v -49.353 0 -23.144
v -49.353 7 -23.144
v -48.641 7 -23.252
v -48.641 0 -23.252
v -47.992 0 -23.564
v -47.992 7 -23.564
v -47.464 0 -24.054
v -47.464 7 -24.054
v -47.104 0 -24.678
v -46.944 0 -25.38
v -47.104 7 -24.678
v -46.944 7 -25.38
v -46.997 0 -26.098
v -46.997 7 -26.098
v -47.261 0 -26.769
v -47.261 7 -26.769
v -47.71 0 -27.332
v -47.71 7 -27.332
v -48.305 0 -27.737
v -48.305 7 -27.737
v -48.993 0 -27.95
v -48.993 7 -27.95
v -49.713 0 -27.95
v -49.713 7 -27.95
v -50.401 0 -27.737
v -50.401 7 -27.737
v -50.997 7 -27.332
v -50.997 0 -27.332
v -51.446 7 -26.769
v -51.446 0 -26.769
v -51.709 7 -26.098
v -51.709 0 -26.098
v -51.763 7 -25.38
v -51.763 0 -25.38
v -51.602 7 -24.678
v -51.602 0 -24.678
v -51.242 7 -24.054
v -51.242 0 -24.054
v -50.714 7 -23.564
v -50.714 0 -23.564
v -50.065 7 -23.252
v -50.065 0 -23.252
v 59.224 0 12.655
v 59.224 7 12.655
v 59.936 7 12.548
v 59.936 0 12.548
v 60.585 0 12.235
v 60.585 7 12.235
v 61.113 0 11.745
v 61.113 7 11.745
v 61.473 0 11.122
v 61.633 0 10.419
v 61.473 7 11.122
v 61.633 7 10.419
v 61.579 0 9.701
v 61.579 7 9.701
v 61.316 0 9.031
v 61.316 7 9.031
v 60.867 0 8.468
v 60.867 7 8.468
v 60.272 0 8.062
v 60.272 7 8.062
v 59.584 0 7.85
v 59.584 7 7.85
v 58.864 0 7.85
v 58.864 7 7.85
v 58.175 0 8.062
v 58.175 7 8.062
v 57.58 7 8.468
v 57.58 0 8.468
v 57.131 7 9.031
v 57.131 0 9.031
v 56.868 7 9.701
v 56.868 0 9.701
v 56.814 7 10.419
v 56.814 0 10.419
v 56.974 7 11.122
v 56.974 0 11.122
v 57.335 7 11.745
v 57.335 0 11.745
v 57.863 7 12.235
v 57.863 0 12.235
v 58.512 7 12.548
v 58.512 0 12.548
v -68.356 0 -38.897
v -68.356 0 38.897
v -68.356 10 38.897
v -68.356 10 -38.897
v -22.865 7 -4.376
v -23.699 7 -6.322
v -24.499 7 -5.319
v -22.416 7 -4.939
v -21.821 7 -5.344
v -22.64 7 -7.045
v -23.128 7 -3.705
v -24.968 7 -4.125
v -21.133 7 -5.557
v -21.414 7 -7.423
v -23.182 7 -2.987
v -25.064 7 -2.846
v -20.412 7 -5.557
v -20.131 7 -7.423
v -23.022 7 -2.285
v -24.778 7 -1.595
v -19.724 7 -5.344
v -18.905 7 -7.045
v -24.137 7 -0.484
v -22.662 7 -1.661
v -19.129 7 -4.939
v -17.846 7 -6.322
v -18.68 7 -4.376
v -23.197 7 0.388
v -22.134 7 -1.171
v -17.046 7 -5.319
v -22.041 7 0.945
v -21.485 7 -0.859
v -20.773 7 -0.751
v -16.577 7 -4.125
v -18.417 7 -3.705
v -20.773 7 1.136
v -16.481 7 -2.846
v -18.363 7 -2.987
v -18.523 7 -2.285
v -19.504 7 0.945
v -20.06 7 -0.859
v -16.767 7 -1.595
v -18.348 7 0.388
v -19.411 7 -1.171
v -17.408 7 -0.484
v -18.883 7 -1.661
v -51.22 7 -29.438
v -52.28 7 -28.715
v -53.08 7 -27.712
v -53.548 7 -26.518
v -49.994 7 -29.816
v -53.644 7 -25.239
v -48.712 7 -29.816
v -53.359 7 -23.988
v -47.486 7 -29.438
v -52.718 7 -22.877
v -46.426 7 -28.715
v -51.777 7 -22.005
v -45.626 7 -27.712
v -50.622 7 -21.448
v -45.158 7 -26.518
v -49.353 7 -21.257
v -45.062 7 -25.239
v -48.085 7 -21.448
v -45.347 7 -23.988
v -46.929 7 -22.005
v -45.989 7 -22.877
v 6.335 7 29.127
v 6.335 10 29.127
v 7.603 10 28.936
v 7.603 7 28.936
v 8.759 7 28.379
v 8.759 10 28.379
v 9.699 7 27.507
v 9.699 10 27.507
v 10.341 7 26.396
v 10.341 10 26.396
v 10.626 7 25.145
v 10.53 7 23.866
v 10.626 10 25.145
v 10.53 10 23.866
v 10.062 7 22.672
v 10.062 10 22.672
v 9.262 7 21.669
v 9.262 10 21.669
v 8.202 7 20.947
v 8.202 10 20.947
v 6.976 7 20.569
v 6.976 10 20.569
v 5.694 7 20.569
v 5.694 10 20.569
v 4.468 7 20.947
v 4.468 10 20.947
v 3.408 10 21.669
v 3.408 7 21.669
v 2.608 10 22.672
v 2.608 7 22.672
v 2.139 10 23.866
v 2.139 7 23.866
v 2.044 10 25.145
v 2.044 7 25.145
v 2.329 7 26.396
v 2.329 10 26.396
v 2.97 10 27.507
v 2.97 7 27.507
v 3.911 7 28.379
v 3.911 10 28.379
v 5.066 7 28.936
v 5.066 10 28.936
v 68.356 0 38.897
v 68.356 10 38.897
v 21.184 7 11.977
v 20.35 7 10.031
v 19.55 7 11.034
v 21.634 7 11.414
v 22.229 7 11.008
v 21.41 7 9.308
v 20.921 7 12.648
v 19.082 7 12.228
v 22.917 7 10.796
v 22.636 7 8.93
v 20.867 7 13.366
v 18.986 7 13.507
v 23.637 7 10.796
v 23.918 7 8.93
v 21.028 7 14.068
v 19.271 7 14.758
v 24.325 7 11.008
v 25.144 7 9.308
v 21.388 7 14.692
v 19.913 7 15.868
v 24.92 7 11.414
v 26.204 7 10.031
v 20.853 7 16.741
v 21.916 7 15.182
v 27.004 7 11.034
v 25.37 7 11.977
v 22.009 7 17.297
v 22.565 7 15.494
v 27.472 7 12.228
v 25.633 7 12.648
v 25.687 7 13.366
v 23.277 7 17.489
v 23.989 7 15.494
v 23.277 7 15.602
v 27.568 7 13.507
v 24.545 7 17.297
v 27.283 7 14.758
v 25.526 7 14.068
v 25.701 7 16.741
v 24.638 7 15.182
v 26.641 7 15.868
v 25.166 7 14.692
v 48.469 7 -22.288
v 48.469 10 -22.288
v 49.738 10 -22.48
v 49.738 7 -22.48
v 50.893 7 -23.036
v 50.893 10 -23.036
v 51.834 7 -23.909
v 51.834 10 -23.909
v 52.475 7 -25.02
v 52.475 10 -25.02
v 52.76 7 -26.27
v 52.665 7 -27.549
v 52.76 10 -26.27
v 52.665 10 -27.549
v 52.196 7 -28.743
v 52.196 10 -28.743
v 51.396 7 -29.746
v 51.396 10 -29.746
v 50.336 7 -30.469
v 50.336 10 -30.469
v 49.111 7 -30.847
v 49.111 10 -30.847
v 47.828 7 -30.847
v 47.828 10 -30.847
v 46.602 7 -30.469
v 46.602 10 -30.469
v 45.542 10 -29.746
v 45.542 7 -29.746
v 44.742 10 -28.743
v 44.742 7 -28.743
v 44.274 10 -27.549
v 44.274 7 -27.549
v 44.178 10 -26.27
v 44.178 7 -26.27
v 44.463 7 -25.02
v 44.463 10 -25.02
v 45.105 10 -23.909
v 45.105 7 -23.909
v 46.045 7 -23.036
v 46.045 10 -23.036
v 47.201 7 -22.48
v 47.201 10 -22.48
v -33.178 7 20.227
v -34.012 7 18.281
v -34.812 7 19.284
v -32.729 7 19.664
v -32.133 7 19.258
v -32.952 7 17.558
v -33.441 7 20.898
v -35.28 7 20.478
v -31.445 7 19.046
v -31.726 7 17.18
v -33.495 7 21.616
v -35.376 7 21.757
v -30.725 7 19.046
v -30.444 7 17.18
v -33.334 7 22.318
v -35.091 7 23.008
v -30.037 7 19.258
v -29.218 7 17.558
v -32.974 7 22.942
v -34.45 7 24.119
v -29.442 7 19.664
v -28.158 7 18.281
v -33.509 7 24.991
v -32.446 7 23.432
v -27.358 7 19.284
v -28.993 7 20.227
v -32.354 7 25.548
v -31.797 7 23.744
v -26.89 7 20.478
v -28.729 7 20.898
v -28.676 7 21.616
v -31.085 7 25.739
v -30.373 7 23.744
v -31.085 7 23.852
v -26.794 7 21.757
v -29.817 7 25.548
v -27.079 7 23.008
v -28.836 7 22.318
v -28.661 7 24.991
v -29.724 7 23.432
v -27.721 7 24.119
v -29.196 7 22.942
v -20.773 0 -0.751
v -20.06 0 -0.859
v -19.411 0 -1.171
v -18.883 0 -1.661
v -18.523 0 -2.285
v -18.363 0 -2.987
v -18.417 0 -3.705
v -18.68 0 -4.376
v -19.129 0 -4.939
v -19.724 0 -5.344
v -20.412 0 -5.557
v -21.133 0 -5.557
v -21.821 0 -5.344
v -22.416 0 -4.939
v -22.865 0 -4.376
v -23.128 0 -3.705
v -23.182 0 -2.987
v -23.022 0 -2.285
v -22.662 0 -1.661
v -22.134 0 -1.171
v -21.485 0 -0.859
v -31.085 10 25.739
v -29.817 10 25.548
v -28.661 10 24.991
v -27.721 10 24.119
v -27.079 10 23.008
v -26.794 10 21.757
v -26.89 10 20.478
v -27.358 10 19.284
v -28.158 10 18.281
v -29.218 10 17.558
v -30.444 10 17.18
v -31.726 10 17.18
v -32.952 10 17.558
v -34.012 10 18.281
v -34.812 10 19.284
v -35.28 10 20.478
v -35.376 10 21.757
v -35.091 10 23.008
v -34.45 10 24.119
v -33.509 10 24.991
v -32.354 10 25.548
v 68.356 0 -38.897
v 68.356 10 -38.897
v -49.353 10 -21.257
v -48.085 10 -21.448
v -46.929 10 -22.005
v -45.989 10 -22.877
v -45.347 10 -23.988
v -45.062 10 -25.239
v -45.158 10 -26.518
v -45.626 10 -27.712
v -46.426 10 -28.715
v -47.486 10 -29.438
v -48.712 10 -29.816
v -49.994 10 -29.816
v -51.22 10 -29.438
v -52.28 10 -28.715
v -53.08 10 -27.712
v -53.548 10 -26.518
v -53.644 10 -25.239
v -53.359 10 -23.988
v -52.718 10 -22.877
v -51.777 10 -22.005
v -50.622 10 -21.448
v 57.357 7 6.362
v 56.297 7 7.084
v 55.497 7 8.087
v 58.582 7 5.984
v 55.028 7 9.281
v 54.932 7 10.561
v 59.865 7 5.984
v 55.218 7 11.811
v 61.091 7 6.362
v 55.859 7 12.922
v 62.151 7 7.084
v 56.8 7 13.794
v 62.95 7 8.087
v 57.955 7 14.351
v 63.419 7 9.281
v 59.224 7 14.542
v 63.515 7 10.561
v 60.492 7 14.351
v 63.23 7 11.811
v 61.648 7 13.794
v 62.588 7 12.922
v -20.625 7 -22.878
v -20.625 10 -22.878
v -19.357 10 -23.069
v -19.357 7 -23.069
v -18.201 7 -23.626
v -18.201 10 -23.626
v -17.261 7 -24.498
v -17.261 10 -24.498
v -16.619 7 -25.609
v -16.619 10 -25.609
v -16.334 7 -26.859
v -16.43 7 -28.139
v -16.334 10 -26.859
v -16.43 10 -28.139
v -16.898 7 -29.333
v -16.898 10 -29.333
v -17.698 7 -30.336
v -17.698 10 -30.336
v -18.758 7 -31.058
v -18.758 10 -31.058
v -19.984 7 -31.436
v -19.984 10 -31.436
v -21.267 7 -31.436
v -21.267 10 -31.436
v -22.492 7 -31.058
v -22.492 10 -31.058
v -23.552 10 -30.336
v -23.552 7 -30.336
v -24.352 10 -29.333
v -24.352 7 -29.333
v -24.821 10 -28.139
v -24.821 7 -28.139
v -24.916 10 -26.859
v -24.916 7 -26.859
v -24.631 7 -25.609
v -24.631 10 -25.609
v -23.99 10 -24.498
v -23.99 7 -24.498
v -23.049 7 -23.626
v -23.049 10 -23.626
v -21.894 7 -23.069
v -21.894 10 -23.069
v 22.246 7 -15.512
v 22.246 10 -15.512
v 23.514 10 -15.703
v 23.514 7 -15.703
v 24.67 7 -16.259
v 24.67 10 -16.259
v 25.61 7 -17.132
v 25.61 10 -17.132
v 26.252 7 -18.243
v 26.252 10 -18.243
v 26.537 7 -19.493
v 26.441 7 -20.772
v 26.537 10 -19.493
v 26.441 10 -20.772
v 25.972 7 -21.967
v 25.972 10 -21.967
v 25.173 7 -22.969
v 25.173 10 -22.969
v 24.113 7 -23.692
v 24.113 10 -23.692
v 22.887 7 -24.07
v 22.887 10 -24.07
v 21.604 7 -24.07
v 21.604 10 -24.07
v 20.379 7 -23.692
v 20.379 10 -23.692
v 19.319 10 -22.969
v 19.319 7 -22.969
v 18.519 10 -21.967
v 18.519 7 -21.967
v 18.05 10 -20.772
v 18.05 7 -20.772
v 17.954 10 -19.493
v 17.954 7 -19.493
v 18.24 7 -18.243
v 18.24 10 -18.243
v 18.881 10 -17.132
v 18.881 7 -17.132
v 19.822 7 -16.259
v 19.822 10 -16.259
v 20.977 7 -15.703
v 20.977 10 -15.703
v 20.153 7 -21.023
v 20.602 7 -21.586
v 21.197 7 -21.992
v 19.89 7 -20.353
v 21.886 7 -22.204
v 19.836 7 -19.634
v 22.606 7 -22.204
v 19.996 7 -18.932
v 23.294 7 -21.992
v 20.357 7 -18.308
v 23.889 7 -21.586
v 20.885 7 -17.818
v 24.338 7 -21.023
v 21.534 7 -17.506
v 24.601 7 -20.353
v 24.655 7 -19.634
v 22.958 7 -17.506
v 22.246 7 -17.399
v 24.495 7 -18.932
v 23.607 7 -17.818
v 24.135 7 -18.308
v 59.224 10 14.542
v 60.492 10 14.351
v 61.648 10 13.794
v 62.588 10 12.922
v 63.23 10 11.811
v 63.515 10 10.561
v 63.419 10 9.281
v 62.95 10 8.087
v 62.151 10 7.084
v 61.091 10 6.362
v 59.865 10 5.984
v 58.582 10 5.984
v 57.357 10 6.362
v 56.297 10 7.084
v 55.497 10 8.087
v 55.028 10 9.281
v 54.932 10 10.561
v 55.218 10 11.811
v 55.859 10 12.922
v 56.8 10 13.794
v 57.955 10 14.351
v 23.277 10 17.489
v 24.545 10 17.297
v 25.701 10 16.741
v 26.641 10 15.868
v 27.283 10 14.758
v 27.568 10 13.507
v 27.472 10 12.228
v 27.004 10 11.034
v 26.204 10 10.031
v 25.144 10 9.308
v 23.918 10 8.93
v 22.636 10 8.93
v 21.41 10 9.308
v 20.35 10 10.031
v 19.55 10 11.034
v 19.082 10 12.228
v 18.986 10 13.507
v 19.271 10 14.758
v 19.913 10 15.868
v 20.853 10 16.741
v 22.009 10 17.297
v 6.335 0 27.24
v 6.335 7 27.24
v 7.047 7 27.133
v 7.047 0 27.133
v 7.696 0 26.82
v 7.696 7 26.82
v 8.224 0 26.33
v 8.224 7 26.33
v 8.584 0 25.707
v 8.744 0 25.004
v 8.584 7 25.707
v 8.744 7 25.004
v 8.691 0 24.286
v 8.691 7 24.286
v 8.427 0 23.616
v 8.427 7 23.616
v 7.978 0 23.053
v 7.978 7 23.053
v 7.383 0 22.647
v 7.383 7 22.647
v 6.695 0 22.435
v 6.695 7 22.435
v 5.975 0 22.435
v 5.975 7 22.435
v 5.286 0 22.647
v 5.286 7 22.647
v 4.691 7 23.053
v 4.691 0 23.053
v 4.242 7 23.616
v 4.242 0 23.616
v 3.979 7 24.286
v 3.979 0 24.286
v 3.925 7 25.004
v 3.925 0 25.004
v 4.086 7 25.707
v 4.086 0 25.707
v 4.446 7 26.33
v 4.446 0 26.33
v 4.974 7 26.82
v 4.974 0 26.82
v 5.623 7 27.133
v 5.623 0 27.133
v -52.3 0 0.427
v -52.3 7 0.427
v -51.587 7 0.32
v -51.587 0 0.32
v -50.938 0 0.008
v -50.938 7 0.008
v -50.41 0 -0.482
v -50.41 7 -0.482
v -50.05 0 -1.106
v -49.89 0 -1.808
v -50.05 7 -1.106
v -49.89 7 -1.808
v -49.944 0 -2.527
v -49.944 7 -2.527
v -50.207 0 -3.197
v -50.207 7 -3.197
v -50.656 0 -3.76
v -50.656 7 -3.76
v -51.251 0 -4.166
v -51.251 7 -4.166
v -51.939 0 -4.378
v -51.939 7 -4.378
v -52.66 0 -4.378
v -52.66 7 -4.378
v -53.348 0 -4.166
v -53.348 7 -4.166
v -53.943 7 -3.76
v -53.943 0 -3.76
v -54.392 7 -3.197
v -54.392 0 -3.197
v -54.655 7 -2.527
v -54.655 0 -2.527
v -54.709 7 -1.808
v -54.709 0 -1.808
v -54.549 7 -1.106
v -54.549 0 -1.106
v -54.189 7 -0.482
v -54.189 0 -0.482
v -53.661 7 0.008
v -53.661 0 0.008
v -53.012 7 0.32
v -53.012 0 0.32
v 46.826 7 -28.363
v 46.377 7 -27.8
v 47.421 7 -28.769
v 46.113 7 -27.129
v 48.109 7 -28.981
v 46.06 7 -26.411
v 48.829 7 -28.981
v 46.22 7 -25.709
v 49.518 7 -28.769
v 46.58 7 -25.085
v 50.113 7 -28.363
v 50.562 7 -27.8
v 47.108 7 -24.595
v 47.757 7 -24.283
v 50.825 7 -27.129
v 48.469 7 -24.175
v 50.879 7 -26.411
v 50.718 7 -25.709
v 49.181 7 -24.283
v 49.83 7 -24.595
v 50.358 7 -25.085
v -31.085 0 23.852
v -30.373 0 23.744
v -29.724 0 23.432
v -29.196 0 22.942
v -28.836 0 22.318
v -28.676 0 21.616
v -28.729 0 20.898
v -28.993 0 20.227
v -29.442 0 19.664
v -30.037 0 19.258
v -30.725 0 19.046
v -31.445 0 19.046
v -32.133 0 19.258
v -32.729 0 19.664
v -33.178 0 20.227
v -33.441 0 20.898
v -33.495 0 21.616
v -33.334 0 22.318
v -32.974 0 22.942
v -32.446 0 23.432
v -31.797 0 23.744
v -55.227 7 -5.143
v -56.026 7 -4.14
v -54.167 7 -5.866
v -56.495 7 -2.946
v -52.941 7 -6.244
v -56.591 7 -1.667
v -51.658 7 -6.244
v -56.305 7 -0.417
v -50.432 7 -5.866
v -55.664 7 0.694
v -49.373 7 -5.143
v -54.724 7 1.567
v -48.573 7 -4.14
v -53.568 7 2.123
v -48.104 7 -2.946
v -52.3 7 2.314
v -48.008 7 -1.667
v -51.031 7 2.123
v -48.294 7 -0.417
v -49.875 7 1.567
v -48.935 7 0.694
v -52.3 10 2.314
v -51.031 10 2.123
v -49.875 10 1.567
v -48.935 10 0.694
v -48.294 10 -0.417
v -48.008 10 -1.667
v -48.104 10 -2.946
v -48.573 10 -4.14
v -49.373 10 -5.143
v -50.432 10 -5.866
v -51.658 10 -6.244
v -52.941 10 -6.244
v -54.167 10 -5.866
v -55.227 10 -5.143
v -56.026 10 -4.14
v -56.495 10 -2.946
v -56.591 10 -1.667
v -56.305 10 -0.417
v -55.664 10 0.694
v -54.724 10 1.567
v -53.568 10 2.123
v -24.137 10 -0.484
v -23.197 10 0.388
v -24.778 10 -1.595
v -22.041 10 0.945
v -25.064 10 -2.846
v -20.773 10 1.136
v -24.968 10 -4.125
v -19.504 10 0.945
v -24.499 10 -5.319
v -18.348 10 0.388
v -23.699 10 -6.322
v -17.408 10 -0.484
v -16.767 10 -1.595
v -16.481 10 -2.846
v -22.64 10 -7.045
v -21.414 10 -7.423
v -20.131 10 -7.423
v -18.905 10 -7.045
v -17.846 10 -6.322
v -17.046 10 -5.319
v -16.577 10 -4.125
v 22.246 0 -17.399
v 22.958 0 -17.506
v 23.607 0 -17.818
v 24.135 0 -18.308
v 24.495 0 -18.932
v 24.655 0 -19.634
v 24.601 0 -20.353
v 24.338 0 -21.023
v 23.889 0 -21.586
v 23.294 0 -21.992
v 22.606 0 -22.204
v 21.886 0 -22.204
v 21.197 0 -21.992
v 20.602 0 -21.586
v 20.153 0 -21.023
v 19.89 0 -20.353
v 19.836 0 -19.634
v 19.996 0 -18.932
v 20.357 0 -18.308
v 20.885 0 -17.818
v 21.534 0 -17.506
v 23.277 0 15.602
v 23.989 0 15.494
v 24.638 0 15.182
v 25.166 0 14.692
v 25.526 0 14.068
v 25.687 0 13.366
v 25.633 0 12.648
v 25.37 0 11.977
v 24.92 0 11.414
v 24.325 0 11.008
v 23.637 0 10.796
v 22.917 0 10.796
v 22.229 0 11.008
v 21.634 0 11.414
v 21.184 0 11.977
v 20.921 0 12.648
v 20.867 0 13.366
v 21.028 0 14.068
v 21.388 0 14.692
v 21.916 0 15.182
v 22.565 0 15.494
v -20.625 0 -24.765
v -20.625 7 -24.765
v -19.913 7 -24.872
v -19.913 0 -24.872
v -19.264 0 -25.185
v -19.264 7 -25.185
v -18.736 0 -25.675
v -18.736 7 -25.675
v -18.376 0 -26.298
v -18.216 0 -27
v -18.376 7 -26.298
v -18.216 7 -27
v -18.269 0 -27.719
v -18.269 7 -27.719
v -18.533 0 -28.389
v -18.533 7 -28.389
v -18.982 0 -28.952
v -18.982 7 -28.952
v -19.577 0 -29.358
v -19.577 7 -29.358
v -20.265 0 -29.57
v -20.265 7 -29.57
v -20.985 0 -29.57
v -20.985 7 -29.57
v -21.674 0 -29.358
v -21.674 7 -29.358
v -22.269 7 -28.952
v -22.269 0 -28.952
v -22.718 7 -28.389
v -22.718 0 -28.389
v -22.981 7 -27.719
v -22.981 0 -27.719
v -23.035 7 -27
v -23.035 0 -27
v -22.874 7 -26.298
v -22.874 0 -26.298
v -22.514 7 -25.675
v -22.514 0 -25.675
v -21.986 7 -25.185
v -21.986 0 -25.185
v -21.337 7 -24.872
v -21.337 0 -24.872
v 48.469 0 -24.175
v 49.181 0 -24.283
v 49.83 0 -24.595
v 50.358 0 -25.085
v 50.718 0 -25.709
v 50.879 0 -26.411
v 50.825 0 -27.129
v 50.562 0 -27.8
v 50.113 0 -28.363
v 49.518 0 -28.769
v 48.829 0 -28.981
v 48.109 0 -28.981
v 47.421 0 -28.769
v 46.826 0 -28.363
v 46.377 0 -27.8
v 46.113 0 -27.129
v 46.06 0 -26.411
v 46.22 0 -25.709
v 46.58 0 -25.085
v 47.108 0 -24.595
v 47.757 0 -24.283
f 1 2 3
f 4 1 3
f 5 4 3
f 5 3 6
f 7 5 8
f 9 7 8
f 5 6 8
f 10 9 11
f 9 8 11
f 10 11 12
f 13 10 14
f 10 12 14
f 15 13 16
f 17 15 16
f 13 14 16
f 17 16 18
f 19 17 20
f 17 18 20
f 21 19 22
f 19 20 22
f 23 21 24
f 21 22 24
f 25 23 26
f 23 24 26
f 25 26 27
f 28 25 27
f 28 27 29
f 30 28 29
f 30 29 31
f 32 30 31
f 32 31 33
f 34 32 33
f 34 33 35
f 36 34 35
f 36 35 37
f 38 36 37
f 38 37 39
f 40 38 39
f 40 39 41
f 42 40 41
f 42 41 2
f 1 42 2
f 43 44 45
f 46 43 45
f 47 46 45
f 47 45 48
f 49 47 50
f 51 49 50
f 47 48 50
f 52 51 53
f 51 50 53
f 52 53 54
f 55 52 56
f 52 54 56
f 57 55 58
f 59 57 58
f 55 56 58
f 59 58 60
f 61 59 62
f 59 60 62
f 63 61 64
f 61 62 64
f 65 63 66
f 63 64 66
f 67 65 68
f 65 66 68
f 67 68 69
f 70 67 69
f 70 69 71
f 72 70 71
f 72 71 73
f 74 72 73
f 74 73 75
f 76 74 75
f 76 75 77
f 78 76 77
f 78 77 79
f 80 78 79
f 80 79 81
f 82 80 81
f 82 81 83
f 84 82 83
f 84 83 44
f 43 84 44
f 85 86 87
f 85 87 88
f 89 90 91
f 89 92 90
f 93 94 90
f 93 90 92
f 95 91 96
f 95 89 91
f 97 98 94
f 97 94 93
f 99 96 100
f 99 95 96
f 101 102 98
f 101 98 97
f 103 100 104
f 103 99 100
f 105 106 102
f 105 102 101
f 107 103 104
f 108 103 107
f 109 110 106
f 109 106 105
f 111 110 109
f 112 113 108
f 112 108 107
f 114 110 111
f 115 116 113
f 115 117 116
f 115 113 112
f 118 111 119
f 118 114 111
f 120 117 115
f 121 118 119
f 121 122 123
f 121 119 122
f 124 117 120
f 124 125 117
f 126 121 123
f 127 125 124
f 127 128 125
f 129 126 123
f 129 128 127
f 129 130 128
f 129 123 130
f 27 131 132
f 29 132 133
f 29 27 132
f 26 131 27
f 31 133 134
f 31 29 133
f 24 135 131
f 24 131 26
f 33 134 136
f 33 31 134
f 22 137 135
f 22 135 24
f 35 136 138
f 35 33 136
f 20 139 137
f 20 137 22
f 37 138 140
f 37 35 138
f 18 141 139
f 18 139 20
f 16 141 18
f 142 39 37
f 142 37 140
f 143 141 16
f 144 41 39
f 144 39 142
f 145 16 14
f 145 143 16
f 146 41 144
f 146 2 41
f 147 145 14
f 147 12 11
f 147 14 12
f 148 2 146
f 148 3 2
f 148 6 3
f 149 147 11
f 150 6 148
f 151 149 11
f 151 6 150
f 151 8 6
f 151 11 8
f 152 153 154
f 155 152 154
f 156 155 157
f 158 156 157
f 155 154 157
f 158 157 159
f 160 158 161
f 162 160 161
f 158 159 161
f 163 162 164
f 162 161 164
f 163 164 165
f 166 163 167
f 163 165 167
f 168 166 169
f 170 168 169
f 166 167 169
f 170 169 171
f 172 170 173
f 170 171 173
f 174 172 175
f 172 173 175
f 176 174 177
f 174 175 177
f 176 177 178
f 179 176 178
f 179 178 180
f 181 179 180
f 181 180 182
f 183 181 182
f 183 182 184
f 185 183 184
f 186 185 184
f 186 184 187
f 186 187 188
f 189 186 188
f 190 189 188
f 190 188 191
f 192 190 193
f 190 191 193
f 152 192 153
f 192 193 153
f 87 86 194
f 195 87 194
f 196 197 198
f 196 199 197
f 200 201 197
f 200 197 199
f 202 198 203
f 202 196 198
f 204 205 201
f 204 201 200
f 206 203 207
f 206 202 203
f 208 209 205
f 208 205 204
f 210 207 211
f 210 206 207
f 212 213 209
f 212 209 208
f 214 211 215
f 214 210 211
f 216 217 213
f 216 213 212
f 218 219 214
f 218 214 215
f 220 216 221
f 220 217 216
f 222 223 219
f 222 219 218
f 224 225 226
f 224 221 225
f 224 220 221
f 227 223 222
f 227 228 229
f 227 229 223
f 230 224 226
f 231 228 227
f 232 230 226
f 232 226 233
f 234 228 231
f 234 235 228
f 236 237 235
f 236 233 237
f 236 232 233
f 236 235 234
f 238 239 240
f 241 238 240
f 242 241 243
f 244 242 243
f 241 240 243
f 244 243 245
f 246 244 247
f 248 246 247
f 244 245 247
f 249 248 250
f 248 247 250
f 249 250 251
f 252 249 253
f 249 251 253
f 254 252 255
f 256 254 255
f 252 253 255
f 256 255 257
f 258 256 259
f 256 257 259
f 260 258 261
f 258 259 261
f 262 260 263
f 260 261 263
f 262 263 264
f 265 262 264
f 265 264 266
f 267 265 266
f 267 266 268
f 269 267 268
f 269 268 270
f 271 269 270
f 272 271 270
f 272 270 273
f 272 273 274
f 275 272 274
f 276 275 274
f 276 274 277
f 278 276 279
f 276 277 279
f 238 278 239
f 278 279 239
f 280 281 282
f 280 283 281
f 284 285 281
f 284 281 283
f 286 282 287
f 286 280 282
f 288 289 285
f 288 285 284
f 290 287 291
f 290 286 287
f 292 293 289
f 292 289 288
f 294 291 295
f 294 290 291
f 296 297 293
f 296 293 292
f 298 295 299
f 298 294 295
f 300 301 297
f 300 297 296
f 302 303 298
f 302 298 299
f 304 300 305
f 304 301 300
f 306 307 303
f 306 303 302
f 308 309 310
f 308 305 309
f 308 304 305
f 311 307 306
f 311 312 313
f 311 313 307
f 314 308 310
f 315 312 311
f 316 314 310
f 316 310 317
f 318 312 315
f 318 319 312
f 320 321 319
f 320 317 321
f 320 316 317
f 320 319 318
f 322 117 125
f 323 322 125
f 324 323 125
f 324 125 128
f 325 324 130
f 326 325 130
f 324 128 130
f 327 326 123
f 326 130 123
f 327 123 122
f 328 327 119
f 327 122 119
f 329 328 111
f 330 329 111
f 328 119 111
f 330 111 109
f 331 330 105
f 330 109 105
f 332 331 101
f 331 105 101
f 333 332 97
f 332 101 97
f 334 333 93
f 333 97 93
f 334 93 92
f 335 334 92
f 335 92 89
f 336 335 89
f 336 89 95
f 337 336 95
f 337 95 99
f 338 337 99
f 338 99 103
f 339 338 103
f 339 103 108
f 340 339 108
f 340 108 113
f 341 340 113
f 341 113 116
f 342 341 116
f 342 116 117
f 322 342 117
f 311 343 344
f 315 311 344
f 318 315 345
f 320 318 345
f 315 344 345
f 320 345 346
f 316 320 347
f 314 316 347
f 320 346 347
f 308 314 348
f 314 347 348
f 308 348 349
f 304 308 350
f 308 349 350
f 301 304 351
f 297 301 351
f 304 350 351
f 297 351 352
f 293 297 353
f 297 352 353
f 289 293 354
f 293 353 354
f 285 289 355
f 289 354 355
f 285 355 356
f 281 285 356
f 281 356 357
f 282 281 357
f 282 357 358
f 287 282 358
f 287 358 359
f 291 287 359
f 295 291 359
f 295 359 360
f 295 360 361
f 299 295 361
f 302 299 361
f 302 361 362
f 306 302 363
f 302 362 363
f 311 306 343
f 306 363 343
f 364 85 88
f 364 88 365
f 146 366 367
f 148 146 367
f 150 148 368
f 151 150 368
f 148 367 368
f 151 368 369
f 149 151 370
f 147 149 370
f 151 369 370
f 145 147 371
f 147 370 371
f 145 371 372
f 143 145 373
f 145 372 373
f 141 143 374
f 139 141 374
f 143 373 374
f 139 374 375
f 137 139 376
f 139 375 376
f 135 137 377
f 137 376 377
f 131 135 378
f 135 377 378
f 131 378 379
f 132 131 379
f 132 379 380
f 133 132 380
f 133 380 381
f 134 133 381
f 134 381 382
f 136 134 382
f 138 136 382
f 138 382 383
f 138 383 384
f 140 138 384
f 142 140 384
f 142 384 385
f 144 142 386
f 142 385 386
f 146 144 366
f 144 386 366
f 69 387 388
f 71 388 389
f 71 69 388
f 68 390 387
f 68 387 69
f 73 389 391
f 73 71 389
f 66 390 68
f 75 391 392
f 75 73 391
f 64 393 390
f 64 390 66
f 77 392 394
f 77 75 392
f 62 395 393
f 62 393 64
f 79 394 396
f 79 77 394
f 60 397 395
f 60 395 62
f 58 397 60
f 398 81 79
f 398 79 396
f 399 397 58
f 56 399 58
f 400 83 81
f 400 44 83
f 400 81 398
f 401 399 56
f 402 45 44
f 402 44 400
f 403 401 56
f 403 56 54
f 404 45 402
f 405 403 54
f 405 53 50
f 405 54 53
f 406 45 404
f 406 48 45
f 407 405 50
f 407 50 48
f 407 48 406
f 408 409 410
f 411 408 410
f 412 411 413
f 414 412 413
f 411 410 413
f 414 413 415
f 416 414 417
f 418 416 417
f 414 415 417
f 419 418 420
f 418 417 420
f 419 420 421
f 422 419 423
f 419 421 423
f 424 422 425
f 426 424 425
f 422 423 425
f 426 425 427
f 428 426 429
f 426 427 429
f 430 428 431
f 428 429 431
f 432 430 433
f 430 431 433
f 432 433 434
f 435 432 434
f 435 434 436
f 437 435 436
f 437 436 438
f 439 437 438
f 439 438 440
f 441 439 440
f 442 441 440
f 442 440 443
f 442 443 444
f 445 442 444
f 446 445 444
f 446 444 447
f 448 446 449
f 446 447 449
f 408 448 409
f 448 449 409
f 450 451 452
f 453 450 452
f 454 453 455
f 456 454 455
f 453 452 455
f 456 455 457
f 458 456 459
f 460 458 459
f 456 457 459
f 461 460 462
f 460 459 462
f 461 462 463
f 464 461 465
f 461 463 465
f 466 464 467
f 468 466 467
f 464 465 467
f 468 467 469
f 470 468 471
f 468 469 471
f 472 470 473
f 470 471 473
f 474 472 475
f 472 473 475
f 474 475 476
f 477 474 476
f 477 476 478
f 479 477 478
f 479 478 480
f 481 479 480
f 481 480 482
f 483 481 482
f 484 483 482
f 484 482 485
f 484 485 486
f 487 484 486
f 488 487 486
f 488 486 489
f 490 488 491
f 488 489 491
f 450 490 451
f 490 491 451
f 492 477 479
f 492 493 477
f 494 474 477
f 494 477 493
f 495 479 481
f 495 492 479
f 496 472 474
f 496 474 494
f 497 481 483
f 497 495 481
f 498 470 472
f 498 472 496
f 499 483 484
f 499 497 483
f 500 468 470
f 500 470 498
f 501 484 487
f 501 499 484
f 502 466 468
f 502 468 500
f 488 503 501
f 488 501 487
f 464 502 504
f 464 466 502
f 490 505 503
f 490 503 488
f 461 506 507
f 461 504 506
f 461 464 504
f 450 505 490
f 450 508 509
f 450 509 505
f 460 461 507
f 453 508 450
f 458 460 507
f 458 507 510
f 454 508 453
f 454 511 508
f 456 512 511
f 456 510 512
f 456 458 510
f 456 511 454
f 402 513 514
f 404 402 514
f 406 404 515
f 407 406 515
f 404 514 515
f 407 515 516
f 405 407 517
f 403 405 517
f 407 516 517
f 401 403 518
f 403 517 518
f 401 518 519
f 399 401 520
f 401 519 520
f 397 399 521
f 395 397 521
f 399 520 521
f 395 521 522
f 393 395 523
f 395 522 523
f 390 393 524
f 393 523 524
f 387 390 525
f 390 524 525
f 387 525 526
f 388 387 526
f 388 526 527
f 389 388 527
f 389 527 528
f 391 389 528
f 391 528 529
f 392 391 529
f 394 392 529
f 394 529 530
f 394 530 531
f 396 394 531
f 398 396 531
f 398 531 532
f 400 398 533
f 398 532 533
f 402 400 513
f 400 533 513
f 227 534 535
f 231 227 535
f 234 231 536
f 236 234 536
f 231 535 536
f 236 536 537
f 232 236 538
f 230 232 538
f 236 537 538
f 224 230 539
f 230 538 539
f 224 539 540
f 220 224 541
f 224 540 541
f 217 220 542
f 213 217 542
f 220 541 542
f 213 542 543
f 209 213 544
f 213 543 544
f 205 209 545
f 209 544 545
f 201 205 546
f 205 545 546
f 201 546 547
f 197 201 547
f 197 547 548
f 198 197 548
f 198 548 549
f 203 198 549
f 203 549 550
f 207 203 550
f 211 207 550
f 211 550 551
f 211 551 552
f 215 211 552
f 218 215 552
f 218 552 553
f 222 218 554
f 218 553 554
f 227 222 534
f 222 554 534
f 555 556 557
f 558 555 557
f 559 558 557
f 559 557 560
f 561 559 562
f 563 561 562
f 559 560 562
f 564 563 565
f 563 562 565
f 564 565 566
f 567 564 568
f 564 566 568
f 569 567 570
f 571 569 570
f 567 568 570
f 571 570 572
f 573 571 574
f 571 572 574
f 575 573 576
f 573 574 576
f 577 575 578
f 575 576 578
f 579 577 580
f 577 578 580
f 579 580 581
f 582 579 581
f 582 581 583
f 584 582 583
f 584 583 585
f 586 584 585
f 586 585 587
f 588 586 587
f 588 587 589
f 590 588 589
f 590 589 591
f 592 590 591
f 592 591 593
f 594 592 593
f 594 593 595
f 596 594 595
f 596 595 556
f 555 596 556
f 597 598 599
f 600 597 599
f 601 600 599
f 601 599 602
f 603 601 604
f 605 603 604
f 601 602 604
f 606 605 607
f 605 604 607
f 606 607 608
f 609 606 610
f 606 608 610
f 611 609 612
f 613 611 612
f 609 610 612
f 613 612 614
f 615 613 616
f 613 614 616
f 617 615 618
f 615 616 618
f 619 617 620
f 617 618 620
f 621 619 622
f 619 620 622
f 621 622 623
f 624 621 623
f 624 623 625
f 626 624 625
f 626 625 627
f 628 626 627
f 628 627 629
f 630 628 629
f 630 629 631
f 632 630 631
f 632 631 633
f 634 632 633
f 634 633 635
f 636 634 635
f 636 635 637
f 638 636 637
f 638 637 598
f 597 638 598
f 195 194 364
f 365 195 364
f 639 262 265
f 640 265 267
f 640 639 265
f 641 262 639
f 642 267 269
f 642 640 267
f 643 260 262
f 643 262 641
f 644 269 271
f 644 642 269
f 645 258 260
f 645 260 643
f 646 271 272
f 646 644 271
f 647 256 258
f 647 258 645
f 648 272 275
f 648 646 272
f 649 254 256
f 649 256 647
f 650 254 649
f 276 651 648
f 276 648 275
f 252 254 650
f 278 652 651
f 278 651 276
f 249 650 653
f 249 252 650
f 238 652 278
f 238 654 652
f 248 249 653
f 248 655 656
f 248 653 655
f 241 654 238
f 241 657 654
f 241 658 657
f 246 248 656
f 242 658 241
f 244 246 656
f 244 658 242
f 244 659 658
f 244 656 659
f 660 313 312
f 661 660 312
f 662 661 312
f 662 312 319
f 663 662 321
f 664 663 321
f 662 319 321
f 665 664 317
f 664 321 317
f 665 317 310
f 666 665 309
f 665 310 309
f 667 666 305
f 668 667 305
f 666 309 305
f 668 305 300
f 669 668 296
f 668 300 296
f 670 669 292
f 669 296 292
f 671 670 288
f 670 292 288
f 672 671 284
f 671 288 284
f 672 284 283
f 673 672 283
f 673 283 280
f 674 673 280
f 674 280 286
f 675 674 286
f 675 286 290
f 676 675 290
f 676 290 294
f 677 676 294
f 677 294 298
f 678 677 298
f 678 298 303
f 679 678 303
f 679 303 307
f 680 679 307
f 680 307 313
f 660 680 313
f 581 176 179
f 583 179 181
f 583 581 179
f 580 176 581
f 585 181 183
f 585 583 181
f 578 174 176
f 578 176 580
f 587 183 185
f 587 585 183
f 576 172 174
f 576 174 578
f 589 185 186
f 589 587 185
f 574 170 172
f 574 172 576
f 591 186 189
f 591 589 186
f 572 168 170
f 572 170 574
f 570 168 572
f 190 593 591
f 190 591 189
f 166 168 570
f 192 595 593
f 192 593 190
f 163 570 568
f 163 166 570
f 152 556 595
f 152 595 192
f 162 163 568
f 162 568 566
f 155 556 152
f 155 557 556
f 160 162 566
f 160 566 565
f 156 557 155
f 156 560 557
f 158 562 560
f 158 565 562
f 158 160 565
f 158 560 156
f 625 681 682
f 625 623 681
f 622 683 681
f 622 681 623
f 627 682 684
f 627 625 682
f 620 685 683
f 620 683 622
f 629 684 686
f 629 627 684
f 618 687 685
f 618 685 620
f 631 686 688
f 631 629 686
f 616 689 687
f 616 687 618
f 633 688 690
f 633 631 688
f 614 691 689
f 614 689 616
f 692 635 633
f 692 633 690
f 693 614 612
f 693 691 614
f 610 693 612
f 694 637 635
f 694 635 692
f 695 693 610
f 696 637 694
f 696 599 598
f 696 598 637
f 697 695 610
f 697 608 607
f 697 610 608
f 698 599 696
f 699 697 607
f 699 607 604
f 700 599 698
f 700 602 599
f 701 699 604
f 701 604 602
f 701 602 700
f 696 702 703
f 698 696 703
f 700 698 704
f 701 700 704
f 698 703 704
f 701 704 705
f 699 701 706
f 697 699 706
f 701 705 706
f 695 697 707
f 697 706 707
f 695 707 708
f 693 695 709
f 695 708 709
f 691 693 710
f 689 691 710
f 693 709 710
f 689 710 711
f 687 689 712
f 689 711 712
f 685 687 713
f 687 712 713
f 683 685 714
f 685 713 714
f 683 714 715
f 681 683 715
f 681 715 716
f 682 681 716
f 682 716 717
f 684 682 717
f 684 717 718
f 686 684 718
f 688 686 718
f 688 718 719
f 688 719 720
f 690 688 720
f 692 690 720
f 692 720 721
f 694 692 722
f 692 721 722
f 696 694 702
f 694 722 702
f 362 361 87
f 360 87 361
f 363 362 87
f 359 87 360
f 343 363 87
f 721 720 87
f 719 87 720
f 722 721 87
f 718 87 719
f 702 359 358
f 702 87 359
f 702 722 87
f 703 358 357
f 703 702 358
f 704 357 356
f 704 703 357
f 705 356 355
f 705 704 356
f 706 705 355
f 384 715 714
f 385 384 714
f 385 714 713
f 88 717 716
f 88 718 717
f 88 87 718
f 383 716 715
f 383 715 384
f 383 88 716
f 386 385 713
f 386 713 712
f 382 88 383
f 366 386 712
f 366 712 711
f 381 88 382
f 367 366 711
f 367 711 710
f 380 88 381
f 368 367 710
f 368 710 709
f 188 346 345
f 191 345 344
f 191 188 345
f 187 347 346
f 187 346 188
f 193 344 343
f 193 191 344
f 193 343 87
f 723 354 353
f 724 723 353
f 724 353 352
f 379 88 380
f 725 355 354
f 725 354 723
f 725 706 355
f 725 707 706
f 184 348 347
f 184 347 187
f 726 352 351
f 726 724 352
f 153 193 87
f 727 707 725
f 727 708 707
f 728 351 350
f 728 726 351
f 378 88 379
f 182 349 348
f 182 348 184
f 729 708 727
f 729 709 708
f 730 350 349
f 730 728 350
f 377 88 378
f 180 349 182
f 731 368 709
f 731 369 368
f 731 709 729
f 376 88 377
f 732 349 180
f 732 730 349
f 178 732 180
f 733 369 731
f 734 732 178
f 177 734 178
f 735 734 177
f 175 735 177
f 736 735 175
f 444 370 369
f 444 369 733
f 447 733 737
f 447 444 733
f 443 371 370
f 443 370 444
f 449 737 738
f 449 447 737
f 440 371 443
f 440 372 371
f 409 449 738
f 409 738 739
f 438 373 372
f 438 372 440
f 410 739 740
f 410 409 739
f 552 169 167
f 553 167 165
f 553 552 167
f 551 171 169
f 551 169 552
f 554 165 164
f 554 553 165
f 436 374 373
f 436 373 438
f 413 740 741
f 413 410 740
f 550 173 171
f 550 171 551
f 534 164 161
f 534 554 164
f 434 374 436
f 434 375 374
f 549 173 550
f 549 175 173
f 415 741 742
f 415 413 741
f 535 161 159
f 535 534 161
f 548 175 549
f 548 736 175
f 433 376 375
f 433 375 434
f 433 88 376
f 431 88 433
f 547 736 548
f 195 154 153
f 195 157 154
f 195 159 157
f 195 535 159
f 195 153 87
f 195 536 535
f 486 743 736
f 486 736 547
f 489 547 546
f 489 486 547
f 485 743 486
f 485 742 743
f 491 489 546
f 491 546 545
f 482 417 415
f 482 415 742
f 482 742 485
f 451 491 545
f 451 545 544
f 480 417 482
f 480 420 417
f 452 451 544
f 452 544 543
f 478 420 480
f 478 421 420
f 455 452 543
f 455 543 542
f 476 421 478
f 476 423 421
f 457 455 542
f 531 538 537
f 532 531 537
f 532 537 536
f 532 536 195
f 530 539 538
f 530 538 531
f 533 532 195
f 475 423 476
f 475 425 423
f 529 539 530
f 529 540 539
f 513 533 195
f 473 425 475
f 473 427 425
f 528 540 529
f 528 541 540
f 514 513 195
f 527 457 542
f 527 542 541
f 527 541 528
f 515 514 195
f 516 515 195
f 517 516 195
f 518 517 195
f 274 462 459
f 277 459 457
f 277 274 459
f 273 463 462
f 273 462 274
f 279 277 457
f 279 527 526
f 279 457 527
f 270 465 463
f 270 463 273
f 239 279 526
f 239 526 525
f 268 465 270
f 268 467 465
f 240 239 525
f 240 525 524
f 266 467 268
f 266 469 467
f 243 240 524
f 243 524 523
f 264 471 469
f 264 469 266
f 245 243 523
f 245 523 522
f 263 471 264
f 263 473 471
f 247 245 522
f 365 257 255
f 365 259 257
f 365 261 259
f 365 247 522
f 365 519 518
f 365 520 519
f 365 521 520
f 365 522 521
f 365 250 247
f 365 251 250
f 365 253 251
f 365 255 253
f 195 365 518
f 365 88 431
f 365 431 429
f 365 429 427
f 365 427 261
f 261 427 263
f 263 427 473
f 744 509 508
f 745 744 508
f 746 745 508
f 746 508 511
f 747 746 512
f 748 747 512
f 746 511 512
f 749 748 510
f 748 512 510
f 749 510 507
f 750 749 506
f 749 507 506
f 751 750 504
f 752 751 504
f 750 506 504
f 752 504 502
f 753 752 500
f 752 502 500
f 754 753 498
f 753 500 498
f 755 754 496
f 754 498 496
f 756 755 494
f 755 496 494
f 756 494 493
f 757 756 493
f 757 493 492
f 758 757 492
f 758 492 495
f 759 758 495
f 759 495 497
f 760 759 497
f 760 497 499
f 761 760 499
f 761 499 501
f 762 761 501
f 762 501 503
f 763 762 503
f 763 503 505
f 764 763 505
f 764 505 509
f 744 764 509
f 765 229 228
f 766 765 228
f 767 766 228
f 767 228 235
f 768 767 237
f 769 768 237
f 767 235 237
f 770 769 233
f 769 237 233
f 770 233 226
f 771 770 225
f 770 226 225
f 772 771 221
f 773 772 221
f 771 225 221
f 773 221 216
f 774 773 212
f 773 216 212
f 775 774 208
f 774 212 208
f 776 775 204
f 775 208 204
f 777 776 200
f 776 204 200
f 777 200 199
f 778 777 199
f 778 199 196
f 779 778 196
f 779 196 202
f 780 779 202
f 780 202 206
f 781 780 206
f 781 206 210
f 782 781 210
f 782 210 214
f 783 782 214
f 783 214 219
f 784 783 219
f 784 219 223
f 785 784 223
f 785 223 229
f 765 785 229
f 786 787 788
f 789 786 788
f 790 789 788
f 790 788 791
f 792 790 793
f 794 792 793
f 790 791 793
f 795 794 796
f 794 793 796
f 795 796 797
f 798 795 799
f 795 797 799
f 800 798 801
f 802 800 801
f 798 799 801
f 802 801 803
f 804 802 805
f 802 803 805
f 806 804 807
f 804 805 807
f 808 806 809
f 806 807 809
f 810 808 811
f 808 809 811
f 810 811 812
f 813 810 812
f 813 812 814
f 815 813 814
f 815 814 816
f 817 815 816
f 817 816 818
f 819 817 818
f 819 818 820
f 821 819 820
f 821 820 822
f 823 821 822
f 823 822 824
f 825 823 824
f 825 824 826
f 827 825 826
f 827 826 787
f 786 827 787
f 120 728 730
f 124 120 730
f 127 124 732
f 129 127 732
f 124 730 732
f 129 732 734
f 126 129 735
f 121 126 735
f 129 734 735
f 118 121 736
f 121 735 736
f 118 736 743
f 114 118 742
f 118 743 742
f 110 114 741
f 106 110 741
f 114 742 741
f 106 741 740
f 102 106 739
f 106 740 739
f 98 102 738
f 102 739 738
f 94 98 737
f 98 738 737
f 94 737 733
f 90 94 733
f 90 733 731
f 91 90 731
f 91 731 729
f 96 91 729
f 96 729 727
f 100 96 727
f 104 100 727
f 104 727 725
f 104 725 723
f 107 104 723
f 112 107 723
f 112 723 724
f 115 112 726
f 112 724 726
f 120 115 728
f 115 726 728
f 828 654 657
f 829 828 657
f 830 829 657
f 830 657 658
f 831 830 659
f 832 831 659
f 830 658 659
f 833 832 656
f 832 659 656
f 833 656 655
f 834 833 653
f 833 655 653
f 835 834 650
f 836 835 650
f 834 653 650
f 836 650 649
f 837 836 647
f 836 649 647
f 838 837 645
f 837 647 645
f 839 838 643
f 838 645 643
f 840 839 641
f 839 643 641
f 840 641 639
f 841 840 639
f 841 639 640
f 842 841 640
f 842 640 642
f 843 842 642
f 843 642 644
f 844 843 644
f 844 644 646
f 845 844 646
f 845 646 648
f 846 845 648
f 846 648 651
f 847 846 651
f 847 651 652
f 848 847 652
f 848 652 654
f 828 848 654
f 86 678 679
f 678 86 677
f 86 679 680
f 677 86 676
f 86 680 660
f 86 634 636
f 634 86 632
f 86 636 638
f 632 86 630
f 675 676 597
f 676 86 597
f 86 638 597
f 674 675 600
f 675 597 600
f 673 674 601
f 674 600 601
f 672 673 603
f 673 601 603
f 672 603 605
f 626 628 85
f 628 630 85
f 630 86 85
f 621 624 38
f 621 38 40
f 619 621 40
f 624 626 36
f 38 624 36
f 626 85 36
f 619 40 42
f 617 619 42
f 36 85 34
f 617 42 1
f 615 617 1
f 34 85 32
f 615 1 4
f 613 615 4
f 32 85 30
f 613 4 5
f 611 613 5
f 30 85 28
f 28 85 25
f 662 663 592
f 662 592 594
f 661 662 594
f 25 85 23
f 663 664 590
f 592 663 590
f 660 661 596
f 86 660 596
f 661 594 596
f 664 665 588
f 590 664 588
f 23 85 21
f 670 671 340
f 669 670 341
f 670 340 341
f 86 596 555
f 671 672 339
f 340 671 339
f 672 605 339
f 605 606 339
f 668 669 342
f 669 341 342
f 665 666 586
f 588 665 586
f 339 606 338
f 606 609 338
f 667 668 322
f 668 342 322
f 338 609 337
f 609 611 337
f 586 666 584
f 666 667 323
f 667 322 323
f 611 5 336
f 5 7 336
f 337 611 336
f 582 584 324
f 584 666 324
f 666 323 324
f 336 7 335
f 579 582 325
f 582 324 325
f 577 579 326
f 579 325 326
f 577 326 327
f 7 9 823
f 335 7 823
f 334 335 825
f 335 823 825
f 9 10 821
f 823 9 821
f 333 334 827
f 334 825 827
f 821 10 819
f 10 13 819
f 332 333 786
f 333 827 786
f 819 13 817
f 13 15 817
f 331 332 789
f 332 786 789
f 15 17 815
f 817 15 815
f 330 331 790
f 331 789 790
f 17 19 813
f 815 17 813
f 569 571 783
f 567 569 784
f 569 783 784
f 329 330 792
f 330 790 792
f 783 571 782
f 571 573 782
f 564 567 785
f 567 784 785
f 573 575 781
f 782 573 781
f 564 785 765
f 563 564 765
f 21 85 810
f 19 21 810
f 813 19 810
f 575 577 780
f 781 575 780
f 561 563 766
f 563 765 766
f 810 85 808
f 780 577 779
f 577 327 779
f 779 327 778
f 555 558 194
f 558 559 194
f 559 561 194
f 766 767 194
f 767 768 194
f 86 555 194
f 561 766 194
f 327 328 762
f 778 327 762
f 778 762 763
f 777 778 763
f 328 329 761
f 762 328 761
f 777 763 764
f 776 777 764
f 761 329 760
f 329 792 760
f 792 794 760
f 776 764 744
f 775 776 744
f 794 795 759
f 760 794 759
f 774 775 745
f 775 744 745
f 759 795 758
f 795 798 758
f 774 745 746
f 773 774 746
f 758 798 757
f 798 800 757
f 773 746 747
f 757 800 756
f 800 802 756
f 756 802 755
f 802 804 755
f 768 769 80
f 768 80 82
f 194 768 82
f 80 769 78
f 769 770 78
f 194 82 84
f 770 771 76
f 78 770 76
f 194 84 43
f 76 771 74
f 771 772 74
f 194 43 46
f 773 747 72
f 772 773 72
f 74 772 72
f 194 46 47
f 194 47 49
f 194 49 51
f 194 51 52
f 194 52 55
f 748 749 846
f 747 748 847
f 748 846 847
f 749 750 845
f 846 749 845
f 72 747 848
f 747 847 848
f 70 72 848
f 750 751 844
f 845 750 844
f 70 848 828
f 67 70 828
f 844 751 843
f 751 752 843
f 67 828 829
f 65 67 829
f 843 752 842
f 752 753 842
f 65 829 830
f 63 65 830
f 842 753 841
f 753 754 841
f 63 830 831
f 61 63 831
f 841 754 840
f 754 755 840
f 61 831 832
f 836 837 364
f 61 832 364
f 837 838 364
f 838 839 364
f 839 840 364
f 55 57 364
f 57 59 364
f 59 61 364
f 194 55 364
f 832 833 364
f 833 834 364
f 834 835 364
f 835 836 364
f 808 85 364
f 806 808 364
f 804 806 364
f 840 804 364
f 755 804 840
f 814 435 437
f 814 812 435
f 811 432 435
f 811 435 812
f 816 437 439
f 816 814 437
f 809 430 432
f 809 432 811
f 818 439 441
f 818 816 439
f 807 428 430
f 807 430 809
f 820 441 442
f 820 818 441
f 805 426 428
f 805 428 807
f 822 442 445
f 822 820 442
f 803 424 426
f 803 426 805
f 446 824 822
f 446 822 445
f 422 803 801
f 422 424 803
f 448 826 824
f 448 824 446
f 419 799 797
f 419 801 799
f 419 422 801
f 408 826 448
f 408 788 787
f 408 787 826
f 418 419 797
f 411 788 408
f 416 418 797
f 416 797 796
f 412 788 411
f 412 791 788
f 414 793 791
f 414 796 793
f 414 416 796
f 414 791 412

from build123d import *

# Parameters (mm, degrees)
SKETCH1_W           = 136.711090248
SKETCH1_H           = 77.79453909
BOSS_EXTRUDE1_DEPTH = 10
SKETCH2_R           = 2.416271905
CUT_EXTRUDE1_DEPTH  = 10
SKETCH3_R           = 4.303274805
CUT_EXTRUDE2_DEPTH  = 3


with BuildPart() as part:
    # Sketch1 → Boss-Extrude1 (new body)
    with BuildSketch(Plane(origin=(0, 0, 0), x_dir=(1, 0, 0), z_dir=(0, 1, 0))):
        Rectangle(SKETCH1_W, SKETCH1_H)
    extrude(amount=BOSS_EXTRUDE1_DEPTH)

    # Sketch2 → Cut-Extrude1 (cut)
    with BuildSketch(Plane(origin=(0, 10, 0), x_dir=(1, 0, 0), z_dir=(0, 1, 0))):
        with Locations(Location((-49.353103883, 25.56048813, 0), (0, 0, 270))):
            Circle(SKETCH2_R)
    cut_extrude1 = extrude(amount=-CUT_EXTRUDE1_DEPTH, mode=Mode.SUBTRACT)

    # Sketch3 → Cut-Extrude2 (cut)
    with BuildSketch(Plane(origin=(0, 10, 0), x_dir=(1, 0, 0), z_dir=(0, 1, 0))):
        with Locations(Location((-49.353103883, 25.56048813, 0), (0, 0, 270))):
            Circle(SKETCH3_R)
    cut_extrude2 = extrude(amount=-CUT_EXTRUDE2_DEPTH, mode=Mode.SUBTRACT)

    # Sketch-Pattern1: Cut-Extrude1, Cut-Extrude2 at 9 more places
    with Locations((71.598831, 0, 5.745585), (72.63009, 0, 38.74587), (28.727926, 0, -1.62055), (-2.946454, 0, 23.571632), (18.268015, 0, 46.995941), (97.822272, 0, -1.031259), (108.576829, 0, 35.799416), (28.580603, 0, 22.39305), (55.68798, 0, 50.384363)):
        add(cut_extrude1, mode=Mode.SUBTRACT)
        add(cut_extrude2, mode=Mode.SUBTRACT)


solid = part.part
